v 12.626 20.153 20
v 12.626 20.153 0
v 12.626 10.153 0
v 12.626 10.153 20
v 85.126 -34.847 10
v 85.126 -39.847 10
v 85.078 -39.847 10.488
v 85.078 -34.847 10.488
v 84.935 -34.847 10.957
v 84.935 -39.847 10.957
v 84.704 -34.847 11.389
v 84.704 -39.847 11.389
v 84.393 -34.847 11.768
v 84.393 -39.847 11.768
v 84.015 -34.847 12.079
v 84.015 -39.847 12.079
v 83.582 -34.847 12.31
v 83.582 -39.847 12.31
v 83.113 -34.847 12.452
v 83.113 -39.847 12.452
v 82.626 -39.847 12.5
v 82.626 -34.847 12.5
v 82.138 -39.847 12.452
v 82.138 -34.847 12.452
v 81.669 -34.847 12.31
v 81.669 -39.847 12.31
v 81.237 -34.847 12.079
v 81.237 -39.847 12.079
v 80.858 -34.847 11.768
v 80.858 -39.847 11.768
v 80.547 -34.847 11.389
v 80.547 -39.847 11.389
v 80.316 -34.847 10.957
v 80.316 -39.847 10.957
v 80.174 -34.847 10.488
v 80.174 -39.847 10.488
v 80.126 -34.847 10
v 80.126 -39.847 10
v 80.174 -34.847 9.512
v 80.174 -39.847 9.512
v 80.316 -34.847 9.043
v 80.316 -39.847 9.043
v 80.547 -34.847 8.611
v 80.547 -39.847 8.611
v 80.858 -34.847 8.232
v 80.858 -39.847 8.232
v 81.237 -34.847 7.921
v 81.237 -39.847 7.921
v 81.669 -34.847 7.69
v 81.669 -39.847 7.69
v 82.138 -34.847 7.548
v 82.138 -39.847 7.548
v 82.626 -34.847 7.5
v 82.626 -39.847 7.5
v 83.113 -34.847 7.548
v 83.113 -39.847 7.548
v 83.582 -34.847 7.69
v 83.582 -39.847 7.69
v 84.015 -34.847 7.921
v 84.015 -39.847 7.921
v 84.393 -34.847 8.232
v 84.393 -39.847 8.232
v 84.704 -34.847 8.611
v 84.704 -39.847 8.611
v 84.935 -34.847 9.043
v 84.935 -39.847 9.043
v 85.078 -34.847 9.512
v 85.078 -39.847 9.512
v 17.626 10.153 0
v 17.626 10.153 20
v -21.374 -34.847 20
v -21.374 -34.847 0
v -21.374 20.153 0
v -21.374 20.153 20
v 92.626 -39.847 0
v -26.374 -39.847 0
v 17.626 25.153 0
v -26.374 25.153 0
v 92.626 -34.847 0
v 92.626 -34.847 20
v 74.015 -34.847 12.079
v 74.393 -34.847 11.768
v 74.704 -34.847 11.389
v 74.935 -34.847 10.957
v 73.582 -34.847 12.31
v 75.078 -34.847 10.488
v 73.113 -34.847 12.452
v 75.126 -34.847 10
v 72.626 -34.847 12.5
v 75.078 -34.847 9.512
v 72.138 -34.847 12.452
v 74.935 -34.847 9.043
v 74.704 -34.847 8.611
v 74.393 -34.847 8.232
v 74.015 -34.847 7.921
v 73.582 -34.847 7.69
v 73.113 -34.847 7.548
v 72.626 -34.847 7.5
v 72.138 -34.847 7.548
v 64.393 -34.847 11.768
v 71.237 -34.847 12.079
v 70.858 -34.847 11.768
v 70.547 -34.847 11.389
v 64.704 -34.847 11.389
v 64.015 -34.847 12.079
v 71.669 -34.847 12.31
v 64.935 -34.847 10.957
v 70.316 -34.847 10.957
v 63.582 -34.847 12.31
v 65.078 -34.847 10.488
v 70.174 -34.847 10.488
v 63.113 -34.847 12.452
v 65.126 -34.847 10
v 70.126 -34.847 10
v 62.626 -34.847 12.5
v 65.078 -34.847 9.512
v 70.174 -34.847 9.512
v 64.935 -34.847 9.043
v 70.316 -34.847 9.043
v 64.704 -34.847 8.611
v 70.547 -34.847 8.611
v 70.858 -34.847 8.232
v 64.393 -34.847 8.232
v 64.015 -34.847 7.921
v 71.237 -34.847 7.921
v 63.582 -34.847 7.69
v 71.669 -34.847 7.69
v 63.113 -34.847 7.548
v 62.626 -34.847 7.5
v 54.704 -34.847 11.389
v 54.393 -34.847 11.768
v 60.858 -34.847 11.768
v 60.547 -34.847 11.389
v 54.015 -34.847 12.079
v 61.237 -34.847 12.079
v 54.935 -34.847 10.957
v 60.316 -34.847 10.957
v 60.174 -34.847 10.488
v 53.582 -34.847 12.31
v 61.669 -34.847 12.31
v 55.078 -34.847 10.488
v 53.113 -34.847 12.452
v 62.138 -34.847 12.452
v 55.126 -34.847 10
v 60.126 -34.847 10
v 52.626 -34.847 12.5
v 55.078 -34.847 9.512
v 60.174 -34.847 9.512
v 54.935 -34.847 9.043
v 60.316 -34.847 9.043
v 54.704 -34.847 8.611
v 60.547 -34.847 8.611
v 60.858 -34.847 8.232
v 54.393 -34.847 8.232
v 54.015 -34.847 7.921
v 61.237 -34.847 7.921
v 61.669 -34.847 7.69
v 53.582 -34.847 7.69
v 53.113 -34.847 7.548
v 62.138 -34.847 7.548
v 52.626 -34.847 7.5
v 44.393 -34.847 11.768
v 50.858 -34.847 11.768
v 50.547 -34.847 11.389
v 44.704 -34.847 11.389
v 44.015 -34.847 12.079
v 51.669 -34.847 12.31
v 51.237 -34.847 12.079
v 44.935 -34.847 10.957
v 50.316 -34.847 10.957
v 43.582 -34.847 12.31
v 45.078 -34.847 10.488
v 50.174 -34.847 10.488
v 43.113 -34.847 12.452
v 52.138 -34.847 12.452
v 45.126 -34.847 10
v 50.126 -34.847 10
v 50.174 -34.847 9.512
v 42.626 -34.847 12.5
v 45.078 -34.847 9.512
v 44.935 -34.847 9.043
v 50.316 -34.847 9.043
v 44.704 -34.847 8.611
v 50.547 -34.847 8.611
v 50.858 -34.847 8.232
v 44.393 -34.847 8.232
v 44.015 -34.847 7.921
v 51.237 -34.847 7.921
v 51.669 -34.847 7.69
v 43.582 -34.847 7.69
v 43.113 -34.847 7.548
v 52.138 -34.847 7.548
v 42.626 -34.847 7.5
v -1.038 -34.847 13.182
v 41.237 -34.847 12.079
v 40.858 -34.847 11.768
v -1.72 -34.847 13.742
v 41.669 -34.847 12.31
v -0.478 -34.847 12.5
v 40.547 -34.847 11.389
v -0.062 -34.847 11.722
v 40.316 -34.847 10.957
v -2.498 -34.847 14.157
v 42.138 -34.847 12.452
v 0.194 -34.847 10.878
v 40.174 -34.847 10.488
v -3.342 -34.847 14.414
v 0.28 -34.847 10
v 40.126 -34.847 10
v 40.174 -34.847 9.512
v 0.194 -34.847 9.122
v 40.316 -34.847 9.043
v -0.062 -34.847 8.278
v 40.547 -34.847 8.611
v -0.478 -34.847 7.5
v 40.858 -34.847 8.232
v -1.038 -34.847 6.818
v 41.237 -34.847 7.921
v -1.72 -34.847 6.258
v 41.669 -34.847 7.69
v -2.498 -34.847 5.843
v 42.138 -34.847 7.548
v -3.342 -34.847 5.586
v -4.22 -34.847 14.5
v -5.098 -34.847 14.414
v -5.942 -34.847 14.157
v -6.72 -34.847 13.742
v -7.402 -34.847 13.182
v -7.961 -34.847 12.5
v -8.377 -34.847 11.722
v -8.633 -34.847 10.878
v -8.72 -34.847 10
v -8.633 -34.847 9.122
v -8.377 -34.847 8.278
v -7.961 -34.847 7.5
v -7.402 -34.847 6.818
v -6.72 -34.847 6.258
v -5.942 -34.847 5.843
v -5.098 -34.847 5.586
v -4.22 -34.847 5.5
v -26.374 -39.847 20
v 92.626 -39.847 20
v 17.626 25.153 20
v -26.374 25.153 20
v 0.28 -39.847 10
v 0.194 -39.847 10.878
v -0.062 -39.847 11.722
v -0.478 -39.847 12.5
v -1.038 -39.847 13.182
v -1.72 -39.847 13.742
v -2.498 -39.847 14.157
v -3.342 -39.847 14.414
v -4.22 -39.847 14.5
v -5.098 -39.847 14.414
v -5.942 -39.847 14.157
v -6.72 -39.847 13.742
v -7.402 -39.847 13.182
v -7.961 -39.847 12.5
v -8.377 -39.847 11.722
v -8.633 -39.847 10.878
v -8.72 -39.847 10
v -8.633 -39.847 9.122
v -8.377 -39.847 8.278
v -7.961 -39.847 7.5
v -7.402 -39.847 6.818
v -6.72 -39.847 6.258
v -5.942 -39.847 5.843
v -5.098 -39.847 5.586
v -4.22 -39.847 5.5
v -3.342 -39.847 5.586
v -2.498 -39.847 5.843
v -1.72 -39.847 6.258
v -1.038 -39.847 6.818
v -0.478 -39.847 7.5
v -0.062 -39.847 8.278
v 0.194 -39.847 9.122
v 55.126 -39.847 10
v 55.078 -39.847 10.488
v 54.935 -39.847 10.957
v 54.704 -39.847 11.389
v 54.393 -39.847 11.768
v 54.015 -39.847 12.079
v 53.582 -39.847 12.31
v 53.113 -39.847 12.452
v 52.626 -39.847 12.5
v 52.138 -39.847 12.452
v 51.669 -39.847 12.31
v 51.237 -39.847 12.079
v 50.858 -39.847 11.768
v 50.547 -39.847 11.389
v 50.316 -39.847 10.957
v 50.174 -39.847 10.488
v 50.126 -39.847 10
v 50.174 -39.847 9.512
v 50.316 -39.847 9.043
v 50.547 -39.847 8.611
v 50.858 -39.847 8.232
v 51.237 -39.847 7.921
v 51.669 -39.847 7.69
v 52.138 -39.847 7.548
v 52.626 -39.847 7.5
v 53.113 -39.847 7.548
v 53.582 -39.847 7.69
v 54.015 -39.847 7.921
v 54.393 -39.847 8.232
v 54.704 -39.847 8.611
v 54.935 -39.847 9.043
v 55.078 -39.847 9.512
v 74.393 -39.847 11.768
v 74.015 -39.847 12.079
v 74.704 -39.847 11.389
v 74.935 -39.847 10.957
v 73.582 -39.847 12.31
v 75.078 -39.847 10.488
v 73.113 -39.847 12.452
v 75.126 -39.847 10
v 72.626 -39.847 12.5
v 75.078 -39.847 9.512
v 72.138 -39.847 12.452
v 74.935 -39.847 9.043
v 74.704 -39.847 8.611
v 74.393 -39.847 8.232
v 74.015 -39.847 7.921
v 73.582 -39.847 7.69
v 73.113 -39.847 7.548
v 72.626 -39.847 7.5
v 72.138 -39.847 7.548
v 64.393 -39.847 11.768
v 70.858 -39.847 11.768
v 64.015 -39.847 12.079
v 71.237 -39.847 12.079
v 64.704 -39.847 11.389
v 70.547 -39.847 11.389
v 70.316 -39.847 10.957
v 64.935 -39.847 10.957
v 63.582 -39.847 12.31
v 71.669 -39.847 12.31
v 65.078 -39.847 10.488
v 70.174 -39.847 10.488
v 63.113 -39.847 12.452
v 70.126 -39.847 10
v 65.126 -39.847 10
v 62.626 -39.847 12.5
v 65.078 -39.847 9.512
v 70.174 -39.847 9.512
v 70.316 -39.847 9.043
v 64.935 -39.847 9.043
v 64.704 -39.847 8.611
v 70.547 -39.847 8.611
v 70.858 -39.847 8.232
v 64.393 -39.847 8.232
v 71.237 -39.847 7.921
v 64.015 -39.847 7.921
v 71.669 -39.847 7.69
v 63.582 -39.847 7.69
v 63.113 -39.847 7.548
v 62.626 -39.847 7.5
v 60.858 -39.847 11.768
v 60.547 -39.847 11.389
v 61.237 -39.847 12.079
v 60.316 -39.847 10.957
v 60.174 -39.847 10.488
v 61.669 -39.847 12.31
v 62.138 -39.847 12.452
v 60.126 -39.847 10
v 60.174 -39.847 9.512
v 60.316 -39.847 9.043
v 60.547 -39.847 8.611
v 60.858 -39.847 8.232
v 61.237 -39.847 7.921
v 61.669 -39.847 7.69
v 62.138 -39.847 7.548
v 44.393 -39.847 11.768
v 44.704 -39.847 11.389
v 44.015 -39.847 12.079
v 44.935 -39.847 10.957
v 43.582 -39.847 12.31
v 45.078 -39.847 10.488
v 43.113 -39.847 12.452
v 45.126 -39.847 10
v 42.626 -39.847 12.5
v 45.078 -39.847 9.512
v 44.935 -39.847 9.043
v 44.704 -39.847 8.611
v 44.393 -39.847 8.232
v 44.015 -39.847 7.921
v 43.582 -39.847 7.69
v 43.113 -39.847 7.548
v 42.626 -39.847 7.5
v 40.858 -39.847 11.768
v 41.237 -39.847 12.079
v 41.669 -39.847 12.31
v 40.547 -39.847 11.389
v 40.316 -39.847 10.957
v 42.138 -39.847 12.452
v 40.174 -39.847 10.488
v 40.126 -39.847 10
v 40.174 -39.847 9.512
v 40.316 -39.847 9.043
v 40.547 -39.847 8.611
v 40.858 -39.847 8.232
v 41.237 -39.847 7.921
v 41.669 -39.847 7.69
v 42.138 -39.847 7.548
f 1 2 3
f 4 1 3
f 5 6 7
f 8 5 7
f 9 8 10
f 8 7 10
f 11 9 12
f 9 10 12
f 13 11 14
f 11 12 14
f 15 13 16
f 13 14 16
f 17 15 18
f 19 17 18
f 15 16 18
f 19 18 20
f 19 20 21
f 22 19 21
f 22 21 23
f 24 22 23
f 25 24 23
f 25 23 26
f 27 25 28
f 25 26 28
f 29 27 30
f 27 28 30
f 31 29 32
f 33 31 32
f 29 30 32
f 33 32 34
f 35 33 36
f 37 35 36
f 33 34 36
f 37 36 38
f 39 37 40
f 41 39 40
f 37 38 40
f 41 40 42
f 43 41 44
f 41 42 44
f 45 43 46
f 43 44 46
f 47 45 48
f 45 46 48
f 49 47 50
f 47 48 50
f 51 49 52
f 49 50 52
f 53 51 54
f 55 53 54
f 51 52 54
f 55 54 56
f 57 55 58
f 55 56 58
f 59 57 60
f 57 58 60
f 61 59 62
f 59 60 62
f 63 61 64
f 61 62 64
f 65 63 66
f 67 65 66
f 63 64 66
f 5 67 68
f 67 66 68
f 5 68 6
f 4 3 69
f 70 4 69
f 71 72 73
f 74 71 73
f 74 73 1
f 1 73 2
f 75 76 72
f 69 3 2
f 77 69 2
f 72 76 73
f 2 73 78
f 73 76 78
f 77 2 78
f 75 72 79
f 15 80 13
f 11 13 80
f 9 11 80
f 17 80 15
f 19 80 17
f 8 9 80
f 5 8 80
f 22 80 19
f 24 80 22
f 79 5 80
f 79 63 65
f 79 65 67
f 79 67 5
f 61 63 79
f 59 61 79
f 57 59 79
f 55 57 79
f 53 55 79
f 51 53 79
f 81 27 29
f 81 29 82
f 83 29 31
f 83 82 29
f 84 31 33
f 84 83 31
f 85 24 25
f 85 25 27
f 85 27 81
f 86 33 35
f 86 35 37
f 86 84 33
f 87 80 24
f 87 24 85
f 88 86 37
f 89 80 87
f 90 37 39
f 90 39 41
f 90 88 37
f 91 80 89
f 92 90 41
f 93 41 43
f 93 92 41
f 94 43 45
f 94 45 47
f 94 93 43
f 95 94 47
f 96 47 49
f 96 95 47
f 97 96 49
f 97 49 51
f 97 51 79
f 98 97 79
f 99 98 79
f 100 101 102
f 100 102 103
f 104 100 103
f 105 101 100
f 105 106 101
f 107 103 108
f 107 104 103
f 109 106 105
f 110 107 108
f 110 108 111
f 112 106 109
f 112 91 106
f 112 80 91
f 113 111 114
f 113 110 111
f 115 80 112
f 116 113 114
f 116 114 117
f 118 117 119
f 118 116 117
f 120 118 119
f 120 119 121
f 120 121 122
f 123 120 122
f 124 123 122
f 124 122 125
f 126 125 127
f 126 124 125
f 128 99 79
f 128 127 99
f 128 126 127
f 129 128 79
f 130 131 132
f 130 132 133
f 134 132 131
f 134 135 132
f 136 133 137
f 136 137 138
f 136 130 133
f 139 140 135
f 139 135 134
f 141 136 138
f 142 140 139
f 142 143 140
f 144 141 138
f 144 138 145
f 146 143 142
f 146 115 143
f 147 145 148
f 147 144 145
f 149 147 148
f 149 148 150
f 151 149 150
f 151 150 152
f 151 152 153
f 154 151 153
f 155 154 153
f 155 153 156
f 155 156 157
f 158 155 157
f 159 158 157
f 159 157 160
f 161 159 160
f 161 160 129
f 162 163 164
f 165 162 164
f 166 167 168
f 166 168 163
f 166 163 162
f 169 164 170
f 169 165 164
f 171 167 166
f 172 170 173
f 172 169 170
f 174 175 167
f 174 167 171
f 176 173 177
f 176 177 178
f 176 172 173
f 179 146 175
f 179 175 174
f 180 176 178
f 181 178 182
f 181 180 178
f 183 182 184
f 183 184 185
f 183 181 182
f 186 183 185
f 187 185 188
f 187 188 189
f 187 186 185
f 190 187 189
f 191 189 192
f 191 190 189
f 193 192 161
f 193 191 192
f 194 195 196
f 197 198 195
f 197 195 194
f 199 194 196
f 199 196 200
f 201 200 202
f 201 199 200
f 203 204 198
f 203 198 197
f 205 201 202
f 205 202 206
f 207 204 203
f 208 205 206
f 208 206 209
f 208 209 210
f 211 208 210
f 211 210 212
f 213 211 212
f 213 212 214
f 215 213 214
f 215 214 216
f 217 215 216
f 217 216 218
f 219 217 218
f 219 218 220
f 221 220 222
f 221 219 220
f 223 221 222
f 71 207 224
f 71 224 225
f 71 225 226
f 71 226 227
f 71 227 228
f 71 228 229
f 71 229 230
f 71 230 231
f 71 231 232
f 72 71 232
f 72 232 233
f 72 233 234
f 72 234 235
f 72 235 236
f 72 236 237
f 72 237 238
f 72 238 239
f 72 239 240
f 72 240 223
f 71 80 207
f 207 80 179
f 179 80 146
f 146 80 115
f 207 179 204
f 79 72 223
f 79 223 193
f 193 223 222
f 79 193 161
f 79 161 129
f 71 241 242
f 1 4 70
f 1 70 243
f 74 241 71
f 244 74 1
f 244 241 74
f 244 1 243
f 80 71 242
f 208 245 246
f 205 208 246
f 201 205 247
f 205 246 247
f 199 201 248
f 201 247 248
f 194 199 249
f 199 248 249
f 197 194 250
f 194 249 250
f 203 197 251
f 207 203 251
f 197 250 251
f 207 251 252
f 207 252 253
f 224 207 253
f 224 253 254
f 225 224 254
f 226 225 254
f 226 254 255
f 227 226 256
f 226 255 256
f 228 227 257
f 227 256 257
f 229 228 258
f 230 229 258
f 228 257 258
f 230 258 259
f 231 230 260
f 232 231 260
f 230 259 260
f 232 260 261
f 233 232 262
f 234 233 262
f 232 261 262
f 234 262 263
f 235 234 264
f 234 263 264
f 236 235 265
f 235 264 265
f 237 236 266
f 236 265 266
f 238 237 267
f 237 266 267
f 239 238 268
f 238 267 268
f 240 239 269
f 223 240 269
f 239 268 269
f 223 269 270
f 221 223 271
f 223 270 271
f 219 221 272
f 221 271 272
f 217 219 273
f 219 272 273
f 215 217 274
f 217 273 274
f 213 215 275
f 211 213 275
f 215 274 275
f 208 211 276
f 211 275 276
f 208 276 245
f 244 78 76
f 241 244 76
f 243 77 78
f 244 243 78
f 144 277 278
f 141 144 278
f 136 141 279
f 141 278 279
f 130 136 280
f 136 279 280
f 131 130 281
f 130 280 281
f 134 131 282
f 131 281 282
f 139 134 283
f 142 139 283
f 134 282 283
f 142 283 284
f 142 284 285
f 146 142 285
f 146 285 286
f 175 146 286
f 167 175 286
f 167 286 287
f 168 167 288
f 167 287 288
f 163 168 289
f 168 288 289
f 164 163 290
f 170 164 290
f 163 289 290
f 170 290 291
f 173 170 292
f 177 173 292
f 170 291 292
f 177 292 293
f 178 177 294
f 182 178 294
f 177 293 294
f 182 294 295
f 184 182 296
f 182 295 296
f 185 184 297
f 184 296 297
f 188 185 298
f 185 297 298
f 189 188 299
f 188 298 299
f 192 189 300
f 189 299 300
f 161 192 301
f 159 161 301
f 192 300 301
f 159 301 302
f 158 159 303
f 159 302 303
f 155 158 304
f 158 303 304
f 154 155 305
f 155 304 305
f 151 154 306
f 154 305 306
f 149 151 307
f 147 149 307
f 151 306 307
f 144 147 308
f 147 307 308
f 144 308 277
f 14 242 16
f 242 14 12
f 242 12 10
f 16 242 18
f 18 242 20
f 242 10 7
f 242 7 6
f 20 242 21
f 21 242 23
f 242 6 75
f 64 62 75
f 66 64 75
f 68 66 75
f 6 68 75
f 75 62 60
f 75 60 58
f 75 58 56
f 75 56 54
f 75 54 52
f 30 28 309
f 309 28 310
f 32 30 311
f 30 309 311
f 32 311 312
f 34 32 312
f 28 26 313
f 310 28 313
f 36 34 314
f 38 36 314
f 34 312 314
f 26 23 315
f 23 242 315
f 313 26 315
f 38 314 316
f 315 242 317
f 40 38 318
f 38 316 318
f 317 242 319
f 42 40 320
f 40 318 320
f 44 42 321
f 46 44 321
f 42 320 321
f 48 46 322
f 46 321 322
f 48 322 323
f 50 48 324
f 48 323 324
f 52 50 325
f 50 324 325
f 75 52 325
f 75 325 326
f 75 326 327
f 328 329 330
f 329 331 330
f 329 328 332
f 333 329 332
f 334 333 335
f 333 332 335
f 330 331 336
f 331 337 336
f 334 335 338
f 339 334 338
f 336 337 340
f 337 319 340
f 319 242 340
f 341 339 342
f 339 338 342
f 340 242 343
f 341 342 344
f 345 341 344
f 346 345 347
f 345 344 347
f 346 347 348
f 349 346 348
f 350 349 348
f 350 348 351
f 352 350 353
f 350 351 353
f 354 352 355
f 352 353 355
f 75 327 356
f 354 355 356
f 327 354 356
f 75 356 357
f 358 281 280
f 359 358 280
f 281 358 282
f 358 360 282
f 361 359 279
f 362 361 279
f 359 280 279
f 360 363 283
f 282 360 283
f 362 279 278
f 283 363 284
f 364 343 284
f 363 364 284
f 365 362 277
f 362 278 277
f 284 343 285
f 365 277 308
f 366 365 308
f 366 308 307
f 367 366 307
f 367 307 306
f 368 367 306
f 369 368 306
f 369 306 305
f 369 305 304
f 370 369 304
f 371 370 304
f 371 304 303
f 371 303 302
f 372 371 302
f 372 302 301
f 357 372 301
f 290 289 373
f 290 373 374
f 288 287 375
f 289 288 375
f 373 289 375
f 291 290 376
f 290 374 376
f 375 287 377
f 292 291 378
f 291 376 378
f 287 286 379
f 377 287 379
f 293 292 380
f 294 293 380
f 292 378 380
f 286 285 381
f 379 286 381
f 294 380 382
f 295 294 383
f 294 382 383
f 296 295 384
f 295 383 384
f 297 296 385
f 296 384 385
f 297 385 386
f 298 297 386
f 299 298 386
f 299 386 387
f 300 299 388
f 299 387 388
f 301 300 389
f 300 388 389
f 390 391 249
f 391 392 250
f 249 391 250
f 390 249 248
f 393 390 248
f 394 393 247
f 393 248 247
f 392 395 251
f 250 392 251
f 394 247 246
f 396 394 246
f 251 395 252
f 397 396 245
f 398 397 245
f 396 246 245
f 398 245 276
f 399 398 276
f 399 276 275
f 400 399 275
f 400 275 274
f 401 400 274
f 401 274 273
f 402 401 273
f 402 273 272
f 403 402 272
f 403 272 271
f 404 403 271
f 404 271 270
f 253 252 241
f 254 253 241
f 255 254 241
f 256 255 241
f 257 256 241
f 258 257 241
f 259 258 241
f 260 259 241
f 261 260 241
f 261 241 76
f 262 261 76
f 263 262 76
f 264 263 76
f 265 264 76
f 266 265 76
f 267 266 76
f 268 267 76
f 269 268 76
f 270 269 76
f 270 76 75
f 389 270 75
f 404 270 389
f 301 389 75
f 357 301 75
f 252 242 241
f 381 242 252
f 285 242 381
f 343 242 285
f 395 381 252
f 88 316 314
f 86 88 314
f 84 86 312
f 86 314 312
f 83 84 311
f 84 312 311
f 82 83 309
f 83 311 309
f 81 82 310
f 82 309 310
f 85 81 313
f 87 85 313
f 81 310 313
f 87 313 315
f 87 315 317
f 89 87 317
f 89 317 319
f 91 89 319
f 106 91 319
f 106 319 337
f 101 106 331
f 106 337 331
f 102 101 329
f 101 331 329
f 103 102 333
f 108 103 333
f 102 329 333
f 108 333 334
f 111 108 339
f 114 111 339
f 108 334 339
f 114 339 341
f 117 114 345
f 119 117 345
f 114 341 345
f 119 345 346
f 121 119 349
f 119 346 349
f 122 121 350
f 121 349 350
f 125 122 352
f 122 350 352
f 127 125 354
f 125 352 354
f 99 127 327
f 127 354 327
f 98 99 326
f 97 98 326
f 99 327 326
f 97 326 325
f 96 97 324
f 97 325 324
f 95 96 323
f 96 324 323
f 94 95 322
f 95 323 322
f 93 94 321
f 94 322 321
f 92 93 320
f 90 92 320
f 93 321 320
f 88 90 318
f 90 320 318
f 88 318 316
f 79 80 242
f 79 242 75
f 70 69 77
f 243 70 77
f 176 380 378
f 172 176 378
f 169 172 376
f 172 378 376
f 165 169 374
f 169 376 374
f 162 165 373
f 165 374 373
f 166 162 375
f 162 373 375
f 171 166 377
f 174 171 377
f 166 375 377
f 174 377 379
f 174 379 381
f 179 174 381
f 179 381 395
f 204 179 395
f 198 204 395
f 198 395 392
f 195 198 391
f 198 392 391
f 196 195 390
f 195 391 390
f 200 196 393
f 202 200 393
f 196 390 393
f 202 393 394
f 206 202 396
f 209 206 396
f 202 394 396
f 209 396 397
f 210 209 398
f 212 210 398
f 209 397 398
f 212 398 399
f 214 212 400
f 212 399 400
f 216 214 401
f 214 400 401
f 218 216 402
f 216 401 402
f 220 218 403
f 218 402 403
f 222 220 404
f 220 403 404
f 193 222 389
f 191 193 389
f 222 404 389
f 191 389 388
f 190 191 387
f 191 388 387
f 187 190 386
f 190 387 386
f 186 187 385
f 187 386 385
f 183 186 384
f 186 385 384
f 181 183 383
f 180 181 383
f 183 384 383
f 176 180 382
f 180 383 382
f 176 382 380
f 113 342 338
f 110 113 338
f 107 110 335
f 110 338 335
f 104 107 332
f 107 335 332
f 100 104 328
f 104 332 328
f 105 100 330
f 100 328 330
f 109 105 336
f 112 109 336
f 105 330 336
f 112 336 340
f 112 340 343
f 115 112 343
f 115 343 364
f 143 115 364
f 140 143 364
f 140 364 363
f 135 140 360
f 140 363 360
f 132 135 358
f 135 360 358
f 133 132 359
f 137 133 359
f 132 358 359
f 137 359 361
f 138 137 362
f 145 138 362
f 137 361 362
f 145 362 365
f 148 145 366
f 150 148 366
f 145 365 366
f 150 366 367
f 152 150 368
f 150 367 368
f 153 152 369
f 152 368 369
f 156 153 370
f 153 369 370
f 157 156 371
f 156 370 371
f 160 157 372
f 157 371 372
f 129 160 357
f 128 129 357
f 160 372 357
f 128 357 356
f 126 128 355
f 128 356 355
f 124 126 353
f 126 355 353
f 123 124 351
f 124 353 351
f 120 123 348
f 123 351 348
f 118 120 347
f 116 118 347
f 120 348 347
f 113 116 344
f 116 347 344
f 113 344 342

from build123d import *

# Parameters (mm, degrees)
ESQUISSE1_W             = 34
ESQUISSE1_H             = 5
BOSS_EXTRU_1_DEPTH      = 20
ESQUISSE2_R             = 4.5
ENL_V_MAT_EXTRU_1_DEPTH = 5
ESQUISSE5_W             = 20
ESQUISSE5_H             = 5
BOSS_EXTRU_2_DEPTH      = 80
ESQUISSE6_R             = 2.5
ENL_V_MAT_EXTRU_2_DEPTH = 5


with BuildPart() as part:
    # Esquisse1 → Boss.-Extru.1 (new body)
    with BuildSketch(Plane.XY):
        Polygon((-21.374377126, 20.152588272), (-21.374377126, 25.152588272), (-26.374377126, 25.152588272), (-26.374377126, -34.847411728), (-21.374377126, -34.847411728), align=None)
        with Locations((-4.374377126, 22.652588272)):
            Rectangle(ESQUISSE1_W, ESQUISSE1_H)
        Polygon((17.625622874, 25.152588272), (12.625622874, 25.152588272), (12.625622874, 20.152588272), (12.625622874, 10.152588272), (17.625622874, 10.152588272), align=None)
        Polygon((12.625622874, -34.847411728), (-21.374377126, -34.847411728), (-26.374377126, -34.847411728), (-26.374377126, -39.847411728), (12.625622874, -39.847411728), align=None)
    extrude(amount=BOSS_EXTRU_1_DEPTH)

    # Esquisse2 → Enlèv. mat.-Extru.1 (cut)
    with BuildSketch(Plane.XZ.offset(39.847411728)):
        with Locations((-4.219859272, 10)):
            Circle(ESQUISSE2_R)
    extrude(amount=-ENL_V_MAT_EXTRU_1_DEPTH, mode=Mode.SUBTRACT)

    # Esquisse5 → Boss.-Extru.2 (add)
    with BuildSketch(Plane(origin=(12.625622874, 0, 0), x_dir=(0, 0, -1), z_dir=(1, 0, 0))):
        with Locations((-10, -37.347411728)):
            Rectangle(ESQUISSE5_W, ESQUISSE5_H)
    extrude(amount=BOSS_EXTRU_2_DEPTH)

    # Esquisse6 → Enlèv. mat.-Extru.2 (cut)
    with BuildSketch(Plane.XZ.offset(39.847411728)):
        with Locations((82.625622874, 10)):
            Circle(ESQUISSE6_R)
        with Locations((72.625622874, 10)):
            Circle(ESQUISSE6_R)
        with Locations((62.625622874, 10)):
            Circle(ESQUISSE6_R)
        with Locations((52.625622874, 10)):
            Circle(ESQUISSE6_R)
        with Locations((42.625622874, 10)):
            Circle(ESQUISSE6_R)
    extrude(amount=-ENL_V_MAT_EXTRU_2_DEPTH, mode=Mode.SUBTRACT)


solid = part.part
